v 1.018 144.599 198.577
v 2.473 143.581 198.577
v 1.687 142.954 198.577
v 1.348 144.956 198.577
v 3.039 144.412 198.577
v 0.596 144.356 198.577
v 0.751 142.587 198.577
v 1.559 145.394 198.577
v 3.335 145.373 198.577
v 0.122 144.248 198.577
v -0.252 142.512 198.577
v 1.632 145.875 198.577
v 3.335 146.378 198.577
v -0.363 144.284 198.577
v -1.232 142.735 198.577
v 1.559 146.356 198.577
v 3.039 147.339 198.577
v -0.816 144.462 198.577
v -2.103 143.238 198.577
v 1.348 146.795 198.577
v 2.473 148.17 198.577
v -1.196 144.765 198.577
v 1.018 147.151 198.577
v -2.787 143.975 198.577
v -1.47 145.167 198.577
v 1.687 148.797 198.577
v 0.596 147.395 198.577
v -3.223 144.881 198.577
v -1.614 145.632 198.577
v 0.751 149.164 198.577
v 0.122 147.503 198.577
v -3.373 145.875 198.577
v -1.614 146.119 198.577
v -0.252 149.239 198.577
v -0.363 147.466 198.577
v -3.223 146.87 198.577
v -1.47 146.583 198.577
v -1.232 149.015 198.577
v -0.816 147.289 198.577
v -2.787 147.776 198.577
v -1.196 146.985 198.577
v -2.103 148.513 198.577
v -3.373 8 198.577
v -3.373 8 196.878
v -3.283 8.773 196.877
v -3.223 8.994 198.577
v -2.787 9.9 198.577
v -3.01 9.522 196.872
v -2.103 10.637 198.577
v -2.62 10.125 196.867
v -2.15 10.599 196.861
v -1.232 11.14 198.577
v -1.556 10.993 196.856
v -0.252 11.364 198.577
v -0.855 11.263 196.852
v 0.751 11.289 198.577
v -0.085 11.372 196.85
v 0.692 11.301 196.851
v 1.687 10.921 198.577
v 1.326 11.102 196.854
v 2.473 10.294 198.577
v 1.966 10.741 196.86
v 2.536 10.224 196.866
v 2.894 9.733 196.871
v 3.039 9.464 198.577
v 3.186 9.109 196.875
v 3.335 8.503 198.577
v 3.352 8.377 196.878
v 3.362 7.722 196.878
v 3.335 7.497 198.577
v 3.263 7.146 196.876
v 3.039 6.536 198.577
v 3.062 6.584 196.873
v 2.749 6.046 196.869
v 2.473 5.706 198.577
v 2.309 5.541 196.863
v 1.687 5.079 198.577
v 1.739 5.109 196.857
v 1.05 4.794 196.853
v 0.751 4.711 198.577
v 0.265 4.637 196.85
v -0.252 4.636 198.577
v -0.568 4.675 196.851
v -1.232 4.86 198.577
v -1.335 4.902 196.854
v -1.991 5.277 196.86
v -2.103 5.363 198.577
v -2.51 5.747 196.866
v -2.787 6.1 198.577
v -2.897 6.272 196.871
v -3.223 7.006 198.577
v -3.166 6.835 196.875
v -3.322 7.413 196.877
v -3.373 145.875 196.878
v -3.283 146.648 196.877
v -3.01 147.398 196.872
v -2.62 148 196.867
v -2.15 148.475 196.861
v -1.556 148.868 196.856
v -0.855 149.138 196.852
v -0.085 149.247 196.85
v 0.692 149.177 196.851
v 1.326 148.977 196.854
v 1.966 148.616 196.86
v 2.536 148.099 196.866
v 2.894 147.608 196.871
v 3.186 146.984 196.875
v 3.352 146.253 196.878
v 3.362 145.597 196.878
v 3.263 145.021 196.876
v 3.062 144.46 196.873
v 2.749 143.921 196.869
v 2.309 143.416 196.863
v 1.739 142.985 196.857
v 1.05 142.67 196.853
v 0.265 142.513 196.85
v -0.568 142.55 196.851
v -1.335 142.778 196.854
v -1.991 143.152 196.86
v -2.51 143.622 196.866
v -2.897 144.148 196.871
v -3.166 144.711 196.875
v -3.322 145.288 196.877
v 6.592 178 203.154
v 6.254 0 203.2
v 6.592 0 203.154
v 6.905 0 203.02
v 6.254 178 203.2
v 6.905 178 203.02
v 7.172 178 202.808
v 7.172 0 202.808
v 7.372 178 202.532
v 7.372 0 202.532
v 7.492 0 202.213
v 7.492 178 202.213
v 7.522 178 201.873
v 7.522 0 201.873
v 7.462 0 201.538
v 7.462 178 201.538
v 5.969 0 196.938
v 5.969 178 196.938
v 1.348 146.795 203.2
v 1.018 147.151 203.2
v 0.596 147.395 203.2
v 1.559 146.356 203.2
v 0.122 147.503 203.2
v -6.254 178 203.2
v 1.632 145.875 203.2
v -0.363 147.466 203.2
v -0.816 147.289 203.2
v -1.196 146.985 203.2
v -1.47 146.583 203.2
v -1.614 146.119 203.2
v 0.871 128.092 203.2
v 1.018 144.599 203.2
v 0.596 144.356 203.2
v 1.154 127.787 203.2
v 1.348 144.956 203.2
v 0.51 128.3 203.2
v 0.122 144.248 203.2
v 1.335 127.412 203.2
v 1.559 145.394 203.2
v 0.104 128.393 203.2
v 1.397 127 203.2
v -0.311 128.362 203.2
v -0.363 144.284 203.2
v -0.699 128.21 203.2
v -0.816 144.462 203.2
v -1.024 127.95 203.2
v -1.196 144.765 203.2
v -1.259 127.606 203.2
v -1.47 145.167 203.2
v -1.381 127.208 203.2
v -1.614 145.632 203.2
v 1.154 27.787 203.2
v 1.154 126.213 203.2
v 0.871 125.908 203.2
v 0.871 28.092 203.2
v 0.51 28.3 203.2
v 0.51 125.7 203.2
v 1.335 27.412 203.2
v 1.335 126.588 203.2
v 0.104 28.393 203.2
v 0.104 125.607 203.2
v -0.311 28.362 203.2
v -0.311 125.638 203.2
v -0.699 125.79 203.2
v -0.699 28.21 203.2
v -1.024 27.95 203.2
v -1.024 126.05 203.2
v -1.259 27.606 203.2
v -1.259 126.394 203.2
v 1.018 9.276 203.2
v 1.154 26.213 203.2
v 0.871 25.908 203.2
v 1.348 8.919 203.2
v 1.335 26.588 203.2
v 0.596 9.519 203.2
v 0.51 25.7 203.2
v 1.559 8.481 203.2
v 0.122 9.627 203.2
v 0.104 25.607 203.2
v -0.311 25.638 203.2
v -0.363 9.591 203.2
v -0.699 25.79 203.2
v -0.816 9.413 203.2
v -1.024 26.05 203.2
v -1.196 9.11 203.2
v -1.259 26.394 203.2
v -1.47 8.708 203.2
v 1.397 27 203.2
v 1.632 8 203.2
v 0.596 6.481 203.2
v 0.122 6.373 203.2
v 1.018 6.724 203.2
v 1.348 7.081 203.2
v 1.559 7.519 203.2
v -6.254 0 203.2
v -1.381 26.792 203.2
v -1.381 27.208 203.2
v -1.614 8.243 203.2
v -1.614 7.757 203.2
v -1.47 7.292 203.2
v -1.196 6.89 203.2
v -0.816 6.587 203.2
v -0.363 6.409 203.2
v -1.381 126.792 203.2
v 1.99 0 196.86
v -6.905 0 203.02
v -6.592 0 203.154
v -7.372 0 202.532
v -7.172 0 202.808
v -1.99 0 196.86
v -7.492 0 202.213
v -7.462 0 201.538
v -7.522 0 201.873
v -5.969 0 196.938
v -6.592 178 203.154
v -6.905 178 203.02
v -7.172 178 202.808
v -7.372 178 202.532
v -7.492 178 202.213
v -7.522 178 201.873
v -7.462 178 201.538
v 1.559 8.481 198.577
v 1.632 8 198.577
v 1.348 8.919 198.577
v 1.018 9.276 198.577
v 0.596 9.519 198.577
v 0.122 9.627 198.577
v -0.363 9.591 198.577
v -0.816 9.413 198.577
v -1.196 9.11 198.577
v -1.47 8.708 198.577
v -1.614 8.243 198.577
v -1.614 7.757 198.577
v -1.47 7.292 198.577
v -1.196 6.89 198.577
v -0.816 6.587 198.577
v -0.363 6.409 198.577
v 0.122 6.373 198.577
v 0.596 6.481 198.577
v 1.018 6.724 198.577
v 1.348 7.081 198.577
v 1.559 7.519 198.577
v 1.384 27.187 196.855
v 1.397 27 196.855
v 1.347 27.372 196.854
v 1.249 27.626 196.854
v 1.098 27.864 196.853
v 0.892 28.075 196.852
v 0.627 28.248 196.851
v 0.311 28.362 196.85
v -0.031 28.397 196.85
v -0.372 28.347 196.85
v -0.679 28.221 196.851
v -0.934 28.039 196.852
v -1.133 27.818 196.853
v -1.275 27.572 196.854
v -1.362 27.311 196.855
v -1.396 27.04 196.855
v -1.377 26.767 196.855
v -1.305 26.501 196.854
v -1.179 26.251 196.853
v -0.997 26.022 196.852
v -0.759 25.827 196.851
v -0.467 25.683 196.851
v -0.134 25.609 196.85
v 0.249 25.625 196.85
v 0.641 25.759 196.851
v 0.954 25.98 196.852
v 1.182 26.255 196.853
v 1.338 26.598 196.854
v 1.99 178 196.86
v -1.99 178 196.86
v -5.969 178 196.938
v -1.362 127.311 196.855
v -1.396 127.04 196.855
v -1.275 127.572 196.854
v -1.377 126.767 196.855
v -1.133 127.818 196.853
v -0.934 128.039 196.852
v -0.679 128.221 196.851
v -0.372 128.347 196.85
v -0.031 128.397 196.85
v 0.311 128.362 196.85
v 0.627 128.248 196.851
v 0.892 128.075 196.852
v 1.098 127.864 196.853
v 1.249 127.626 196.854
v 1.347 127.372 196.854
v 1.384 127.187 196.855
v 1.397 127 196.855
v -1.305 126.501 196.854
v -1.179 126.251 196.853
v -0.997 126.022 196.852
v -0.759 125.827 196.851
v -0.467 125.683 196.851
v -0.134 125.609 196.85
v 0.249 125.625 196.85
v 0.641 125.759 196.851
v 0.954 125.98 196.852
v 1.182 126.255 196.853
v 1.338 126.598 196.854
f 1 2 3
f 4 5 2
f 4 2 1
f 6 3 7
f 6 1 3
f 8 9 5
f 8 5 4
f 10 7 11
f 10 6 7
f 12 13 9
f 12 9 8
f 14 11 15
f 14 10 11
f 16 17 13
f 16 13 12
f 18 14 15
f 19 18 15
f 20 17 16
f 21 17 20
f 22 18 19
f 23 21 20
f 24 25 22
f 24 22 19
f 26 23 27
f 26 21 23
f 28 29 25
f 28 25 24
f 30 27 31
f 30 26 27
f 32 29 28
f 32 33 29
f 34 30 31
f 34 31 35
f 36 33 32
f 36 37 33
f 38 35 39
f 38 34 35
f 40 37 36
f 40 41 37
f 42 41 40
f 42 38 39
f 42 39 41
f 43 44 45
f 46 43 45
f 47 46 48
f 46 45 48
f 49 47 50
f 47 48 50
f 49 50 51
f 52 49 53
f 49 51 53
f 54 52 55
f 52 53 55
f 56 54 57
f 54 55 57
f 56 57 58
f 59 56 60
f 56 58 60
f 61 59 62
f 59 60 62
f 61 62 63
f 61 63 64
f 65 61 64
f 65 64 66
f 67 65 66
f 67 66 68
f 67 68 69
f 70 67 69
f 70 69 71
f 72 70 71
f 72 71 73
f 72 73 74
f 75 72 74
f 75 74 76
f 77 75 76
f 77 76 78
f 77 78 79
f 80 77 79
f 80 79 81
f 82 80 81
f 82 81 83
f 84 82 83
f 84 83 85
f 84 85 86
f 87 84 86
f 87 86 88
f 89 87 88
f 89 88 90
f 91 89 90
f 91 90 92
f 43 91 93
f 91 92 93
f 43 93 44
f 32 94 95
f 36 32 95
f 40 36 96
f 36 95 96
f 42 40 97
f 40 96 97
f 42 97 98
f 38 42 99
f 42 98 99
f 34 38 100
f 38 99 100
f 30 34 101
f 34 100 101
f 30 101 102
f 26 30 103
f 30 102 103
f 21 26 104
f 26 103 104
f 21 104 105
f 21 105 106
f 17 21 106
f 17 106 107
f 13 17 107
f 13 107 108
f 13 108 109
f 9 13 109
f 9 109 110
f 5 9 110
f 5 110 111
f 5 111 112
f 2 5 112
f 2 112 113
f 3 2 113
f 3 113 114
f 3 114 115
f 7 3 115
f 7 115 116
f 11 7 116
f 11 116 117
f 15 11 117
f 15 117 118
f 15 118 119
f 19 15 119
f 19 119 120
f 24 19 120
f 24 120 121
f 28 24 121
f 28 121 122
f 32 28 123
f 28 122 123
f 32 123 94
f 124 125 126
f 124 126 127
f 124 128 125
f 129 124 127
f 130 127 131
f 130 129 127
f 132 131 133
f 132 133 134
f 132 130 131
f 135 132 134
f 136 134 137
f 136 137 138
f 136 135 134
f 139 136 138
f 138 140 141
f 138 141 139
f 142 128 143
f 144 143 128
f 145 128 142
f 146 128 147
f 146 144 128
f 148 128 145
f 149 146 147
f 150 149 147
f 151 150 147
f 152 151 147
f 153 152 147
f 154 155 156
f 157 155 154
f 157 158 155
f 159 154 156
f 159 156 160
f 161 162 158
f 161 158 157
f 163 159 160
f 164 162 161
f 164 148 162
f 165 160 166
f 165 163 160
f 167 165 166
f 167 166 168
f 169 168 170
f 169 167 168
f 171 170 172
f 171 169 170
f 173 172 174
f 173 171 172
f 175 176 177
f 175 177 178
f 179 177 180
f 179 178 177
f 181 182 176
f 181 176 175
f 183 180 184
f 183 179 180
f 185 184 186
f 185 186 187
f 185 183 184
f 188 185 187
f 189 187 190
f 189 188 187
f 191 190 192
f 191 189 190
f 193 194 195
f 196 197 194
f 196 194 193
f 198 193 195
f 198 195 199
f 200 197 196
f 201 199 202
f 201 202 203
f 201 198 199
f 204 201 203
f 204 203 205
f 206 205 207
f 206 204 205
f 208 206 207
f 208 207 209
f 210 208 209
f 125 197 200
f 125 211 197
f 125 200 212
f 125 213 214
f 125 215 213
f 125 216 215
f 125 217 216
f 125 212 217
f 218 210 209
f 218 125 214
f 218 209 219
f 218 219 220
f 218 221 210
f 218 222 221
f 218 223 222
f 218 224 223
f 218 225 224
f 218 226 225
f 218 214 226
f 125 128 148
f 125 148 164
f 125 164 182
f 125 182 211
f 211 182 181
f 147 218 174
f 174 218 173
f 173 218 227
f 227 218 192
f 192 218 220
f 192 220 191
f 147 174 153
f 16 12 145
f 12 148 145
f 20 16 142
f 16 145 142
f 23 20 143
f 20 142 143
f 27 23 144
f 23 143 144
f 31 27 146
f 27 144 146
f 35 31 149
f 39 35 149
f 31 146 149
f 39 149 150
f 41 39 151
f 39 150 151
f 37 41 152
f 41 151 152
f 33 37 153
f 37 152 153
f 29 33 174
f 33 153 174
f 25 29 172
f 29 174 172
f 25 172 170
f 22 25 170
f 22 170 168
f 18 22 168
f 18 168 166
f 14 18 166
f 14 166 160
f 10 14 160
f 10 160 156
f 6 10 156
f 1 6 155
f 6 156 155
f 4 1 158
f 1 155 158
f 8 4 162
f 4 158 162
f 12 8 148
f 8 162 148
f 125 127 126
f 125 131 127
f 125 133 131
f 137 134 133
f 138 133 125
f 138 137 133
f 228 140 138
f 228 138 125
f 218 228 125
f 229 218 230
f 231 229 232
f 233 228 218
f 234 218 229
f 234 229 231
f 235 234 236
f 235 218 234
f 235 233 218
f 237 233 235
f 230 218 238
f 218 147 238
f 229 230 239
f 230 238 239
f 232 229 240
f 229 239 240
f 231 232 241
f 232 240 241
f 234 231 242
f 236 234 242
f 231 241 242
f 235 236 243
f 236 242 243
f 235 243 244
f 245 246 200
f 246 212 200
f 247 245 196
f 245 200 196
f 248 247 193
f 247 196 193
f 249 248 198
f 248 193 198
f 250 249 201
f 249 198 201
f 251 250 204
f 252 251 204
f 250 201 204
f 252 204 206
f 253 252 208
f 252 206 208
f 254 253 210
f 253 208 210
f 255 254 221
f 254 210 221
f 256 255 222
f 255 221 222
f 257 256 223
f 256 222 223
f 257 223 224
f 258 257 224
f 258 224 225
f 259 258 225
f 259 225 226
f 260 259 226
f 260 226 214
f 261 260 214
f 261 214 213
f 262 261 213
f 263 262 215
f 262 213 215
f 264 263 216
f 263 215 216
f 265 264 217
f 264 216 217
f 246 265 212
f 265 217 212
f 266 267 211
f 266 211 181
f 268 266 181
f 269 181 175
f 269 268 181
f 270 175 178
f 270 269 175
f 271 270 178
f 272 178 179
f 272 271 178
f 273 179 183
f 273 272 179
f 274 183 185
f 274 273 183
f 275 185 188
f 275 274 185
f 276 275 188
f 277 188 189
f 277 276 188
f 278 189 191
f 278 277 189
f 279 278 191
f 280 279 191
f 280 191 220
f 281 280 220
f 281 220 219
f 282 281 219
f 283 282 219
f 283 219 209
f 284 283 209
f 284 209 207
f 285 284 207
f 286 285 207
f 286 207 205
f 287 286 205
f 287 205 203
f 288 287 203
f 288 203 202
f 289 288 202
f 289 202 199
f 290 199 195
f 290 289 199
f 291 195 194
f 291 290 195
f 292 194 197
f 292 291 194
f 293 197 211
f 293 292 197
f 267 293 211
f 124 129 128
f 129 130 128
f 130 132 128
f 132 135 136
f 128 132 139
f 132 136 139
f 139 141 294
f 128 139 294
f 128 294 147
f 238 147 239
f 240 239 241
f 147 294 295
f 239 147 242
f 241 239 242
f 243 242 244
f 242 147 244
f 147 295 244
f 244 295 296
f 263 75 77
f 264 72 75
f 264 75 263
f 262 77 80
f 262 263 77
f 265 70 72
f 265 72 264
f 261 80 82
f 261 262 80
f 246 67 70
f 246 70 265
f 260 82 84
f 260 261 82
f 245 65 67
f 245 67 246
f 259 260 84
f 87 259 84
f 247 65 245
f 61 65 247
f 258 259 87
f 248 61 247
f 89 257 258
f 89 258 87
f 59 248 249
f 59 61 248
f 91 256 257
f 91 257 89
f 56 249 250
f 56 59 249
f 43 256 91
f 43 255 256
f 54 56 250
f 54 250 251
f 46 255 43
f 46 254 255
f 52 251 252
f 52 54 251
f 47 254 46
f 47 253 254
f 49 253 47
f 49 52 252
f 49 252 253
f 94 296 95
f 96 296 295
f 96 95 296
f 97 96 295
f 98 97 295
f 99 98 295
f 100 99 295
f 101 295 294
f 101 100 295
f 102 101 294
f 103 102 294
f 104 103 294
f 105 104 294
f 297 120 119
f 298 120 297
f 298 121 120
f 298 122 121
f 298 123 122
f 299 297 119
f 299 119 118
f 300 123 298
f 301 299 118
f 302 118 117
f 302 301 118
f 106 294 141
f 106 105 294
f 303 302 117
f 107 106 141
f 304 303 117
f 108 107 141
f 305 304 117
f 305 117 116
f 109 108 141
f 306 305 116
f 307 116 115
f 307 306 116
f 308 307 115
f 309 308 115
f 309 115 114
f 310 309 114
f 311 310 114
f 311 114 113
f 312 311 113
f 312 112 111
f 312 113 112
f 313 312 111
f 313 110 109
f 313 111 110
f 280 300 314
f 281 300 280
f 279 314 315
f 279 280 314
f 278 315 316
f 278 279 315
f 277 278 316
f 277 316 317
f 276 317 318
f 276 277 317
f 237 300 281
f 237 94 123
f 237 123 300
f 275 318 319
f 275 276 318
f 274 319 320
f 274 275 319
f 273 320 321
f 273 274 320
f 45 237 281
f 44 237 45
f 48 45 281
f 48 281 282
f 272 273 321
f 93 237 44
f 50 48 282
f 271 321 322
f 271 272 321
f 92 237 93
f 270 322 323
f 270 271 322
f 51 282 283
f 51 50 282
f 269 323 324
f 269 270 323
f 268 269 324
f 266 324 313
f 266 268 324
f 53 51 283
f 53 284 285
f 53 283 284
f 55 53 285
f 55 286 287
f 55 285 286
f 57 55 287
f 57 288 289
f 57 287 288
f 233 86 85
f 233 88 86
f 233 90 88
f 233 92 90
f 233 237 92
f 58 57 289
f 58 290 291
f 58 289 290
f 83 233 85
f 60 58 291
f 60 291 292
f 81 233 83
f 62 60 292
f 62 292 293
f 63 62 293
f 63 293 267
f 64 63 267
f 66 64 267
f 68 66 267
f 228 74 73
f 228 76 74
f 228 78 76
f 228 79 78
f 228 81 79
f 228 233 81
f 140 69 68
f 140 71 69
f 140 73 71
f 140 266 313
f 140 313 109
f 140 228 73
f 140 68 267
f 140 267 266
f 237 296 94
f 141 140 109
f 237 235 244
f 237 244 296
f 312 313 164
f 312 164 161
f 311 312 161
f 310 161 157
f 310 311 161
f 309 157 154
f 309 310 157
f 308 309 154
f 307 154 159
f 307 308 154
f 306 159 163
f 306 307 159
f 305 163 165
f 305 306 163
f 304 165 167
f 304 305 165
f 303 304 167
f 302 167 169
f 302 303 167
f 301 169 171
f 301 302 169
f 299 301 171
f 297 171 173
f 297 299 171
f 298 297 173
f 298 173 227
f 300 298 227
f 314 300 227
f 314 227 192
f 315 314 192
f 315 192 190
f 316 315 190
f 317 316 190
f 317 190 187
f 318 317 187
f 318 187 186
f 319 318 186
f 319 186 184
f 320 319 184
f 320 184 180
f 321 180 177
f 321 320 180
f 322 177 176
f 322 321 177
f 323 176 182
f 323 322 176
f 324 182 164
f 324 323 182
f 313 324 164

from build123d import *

# Parameters (mm, degrees)
BOSS_EXTRUDE1_DEPTH                                 = 178
CBORE_FOR_4_BINDING_HEAD_MACHINE_SCREW3_D           = 3.2639
CBORE_FOR_4_BINDING_HEAD_MACHINE_SCREW3_CBORE_D     = 6.74624
CBORE_FOR_4_BINDING_HEAD_MACHINE_SCREW3_CBORE_DEPTH = 1.7272
SKETCH3_R                                           = 1.397
CUT_EXTRUDE1_DEPTH                                  = 7.35
FILLET1_R                                           = 1.27


with BuildPart() as part:
    # Sketch2 → Boss-Extrude1 (new body)
    with BuildSketch(Plane(origin=(0, 0, 0), x_dir=(1, 0, 0), z_dir=(0, 1, 0))):
        with BuildLine():
            Line((8.001, -203.2), (-8.001, -203.2))
            Line((-8.001, -203.2), (-5.969, -196.937688608))
            ThreePointArc((-5.969, -196.937688608), (0, -196.85), (5.969, -196.937688608))
            Line((5.969, -196.937688608), (8.001, -203.2))
        make_face()
    extrude(amount=BOSS_EXTRUDE1_DEPTH)

    # CBORE for #4 Binding Head Machine Screw3 (through all)
    with Locations(Plane(origin=(0, 8, 196.85), x_dir=(-1, 0, 0), z_dir=(0, 0, -1))):
        with Locations((0, 0), (0, 137.875371205)):
            CounterBoreHole(CBORE_FOR_4_BINDING_HEAD_MACHINE_SCREW3_D / 2, CBORE_FOR_4_BINDING_HEAD_MACHINE_SCREW3_CBORE_D / 2, CBORE_FOR_4_BINDING_HEAD_MACHINE_SCREW3_CBORE_DEPTH)

    # Sketch3 → Cut-Extrude1 (cut, through all)
    with BuildSketch(Plane.XY.offset(196.85)):
        with Locations((0, 27)):
            Circle(SKETCH3_R)
        with Locations((0, 127)):
            Circle(SKETCH3_R)
    extrude(amount=CUT_EXTRUDE1_DEPTH, mode=Mode.SUBTRACT)

    # Fillet1
    fillet1_edges = [part.edges().sort_by_distance(p)[0] for p in [
        (8.001, 89, 203.2),
        (-8.001, 89, 203.2),
    ]]
    fillet(fillet1_edges, radius=FILLET1_R)


solid = part.part
